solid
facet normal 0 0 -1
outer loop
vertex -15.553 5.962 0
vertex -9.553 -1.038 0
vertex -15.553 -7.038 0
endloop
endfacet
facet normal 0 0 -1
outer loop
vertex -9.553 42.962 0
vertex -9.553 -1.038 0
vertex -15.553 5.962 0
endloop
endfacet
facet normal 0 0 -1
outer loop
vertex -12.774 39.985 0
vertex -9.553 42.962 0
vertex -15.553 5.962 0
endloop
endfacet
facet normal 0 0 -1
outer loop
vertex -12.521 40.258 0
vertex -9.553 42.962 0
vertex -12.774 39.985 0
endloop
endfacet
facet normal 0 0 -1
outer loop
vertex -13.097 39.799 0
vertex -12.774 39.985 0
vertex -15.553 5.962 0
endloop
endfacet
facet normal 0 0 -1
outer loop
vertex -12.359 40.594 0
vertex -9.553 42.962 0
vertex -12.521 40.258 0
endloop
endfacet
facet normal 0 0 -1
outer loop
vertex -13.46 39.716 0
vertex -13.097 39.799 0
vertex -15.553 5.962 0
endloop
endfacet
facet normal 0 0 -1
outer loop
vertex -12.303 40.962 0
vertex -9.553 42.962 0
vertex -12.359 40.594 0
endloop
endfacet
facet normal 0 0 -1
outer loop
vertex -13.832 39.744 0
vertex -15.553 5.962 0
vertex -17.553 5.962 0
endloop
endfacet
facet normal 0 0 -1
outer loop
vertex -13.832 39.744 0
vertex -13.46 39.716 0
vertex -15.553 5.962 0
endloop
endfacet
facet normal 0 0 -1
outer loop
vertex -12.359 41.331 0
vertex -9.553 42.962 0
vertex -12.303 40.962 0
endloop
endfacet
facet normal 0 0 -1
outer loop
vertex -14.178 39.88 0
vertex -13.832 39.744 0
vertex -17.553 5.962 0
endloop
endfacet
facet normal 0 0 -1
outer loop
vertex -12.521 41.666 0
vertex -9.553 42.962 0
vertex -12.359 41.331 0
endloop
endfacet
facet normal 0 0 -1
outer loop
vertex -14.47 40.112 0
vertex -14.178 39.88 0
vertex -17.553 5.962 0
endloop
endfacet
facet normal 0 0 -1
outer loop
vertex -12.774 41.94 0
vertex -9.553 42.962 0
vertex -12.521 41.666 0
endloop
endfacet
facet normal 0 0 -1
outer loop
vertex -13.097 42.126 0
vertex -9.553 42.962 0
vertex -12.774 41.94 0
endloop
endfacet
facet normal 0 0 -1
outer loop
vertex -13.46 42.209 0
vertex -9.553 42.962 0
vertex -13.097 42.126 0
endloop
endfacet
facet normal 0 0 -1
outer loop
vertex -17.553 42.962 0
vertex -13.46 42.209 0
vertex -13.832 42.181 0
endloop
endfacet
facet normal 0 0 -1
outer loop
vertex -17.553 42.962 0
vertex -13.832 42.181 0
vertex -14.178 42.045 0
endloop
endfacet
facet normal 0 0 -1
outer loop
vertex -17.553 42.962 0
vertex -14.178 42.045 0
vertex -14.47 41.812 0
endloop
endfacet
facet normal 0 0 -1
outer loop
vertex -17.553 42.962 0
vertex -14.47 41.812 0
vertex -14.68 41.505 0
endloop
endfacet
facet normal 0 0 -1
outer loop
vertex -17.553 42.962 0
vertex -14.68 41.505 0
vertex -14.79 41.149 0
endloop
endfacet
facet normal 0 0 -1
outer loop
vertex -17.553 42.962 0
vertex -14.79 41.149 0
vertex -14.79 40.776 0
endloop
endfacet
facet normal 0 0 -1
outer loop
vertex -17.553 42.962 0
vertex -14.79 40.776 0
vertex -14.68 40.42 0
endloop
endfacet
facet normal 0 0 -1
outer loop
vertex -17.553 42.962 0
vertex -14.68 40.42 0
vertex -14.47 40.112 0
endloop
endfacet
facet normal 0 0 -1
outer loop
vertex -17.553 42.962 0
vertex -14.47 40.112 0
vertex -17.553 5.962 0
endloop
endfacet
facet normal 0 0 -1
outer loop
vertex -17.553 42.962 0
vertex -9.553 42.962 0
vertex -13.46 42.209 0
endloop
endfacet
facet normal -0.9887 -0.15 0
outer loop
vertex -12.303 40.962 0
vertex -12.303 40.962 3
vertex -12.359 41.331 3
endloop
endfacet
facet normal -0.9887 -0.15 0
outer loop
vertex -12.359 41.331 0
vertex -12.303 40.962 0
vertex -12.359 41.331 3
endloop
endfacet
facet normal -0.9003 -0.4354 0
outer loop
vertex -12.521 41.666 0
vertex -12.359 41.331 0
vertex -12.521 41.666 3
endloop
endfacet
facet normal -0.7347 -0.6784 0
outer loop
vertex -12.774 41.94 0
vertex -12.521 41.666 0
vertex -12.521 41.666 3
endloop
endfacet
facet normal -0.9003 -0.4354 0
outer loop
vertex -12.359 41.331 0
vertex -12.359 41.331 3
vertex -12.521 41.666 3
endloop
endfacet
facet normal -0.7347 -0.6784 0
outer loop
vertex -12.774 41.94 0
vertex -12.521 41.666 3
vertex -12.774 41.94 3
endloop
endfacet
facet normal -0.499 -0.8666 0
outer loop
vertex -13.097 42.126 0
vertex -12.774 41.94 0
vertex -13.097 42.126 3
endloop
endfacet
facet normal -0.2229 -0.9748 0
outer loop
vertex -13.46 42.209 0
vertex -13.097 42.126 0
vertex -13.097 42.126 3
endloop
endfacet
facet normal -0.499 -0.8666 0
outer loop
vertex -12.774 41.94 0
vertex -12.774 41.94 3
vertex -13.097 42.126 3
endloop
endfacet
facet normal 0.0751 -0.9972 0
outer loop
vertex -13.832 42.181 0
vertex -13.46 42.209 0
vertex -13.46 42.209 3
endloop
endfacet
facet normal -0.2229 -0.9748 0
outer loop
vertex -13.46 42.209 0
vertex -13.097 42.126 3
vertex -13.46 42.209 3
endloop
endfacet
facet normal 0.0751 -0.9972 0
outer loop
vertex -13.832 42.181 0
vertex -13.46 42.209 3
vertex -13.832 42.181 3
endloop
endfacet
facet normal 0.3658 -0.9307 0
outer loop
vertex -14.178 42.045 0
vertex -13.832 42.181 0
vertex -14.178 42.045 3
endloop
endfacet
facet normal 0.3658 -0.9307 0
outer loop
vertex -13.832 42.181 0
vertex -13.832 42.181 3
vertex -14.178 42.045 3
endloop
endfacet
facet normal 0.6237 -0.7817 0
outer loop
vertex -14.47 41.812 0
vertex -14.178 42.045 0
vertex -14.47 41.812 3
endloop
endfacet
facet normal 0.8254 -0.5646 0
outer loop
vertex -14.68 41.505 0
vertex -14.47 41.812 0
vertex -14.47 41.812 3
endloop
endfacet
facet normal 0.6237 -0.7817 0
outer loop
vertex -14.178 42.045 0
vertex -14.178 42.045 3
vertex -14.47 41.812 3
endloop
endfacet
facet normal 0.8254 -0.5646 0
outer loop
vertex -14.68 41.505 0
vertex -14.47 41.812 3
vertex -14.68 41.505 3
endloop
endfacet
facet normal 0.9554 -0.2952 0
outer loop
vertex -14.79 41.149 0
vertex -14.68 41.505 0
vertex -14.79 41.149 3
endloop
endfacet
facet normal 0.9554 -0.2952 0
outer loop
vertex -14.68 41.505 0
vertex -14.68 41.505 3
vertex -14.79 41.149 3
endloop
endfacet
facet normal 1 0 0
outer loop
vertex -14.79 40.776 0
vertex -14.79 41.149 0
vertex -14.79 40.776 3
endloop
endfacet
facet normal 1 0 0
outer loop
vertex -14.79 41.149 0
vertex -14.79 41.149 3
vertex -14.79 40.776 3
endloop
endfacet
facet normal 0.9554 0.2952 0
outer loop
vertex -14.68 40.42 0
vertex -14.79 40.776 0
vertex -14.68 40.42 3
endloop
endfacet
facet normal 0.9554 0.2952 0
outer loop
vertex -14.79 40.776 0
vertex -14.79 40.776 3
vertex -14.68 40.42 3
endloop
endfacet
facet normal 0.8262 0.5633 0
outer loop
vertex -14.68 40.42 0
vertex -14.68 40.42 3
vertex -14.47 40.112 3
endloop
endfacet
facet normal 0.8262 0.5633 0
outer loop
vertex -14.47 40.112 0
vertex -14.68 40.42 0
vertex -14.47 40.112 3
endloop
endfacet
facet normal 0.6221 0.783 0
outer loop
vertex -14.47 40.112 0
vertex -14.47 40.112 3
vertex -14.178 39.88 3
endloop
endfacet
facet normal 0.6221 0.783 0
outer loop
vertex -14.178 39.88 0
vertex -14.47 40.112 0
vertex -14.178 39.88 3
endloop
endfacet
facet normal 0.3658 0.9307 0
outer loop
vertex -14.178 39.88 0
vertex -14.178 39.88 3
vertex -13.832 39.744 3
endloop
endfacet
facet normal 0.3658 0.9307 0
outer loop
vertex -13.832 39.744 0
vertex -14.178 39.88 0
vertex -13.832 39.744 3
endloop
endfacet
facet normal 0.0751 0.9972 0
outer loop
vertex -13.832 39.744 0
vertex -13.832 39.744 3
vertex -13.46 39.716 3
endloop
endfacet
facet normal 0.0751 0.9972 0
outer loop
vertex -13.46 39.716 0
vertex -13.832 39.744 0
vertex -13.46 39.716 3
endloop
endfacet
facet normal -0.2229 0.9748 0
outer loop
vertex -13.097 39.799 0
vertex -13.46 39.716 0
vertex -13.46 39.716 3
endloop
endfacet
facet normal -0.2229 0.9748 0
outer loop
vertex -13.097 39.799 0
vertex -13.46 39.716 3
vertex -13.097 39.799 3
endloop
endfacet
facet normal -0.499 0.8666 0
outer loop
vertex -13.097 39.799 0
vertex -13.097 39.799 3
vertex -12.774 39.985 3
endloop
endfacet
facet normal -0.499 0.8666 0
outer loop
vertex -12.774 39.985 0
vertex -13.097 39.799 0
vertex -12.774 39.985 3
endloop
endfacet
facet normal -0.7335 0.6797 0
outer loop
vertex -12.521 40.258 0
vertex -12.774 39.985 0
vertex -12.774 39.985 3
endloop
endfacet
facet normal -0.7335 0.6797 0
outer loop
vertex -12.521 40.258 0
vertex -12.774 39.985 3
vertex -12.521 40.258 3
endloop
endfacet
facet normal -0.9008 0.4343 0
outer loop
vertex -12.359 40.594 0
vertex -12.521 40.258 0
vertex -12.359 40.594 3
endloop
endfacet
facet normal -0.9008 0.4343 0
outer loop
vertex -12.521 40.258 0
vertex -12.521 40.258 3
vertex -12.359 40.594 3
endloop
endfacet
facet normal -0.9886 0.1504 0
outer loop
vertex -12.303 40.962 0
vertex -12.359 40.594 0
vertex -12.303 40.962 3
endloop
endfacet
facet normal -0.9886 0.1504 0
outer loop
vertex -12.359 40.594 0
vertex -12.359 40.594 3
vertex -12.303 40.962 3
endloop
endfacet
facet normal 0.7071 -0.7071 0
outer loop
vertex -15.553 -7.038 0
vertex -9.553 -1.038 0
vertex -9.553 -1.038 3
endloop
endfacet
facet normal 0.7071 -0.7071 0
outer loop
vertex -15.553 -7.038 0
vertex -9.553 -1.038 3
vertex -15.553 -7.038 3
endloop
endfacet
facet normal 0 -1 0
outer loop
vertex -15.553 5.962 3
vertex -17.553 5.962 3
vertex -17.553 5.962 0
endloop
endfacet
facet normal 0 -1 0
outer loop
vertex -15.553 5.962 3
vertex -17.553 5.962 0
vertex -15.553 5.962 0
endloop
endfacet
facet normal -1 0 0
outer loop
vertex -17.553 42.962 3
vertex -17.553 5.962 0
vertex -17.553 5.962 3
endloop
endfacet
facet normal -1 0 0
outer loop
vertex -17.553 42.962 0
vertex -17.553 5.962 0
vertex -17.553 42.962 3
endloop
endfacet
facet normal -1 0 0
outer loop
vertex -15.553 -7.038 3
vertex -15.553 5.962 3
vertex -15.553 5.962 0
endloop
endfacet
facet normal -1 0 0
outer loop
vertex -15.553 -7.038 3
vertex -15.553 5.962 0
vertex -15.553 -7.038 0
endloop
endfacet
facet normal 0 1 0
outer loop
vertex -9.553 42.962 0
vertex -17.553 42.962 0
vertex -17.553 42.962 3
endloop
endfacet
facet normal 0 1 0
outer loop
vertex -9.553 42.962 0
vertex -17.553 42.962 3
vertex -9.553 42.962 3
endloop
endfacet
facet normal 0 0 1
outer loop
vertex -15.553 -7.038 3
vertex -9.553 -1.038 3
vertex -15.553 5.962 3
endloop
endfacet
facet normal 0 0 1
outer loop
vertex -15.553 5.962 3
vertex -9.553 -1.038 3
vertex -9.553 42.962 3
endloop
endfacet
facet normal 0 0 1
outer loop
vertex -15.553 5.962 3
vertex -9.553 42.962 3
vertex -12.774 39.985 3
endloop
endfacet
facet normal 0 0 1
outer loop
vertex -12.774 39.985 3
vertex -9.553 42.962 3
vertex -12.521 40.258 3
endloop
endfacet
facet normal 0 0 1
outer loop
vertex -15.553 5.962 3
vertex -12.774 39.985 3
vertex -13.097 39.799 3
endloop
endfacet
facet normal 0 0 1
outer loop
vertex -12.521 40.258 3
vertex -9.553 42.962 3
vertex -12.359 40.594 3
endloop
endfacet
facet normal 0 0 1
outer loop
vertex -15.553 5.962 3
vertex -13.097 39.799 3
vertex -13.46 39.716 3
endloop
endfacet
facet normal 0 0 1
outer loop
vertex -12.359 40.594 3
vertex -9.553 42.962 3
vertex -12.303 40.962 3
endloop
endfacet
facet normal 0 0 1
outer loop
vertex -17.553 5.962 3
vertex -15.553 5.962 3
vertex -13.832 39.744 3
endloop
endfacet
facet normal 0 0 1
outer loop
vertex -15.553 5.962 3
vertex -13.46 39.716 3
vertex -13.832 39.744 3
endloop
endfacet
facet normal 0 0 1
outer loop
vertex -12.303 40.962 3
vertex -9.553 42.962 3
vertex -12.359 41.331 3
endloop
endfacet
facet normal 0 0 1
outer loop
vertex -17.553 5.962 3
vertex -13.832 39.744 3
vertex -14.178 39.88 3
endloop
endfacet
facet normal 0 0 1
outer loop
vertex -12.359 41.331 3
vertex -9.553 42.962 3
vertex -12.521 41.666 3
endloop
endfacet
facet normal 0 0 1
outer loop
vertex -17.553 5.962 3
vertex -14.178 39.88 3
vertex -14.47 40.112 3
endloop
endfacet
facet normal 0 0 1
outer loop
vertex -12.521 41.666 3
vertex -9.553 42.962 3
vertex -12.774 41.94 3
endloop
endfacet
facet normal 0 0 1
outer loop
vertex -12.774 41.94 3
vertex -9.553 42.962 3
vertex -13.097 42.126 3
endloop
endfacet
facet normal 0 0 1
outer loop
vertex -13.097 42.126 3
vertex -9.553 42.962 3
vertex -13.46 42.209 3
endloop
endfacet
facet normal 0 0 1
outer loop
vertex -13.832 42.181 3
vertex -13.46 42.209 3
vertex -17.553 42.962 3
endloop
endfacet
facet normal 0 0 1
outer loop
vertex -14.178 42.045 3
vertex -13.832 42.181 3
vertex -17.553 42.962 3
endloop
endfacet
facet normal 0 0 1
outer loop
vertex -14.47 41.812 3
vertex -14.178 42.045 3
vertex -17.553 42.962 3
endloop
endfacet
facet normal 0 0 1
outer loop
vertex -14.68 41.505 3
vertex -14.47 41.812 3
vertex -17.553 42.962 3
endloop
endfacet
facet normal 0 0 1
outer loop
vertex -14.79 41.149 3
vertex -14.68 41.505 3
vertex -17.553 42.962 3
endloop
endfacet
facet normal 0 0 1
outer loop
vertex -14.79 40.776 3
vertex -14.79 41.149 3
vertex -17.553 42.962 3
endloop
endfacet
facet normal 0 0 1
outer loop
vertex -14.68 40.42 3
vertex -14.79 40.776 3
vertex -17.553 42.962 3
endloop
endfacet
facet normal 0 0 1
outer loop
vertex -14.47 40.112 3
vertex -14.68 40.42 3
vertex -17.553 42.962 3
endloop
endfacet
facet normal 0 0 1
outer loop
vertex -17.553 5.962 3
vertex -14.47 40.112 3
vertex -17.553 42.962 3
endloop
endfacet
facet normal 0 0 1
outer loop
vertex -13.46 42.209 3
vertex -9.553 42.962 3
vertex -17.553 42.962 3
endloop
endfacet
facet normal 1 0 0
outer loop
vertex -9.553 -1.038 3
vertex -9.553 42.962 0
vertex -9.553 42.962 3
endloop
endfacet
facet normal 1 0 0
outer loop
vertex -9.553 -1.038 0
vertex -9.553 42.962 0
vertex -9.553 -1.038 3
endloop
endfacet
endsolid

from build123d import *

# Parameters (mm, degrees)
BOSS_EXTRUDE1_DEPTH = 3
SKETCH2_R           = 1.25
CUT_EXTRUDE1_DEPTH  = 3


with BuildPart() as part:
    # Sketch1 → Boss-Extrude1 (new body)
    with BuildSketch(Plane.XY):
        Polygon((-9.553498798, 42.962261971), (-9.553498798, -1.037738029), (-17.553498798, -9.037738029), (-17.553498798, 42.962261971), align=None)
    extrude(amount=BOSS_EXTRUDE1_DEPTH)

    # Sketch2 → Cut-Extrude1 (cut)
    with BuildSketch(Plane.XY.offset(3)):
        with Locations((-13.553498798, 40.962261971)):
            Circle(SKETCH2_R)
        Polygon((-17.553498798, -9.037738029), (-17.553498798, 5.962261971), (-15.553498798, 5.962261971), (-15.553498798, -7.037738029), align=None)
    extrude(amount=-CUT_EXTRUDE1_DEPTH, mode=Mode.SUBTRACT)


solid = part.part
